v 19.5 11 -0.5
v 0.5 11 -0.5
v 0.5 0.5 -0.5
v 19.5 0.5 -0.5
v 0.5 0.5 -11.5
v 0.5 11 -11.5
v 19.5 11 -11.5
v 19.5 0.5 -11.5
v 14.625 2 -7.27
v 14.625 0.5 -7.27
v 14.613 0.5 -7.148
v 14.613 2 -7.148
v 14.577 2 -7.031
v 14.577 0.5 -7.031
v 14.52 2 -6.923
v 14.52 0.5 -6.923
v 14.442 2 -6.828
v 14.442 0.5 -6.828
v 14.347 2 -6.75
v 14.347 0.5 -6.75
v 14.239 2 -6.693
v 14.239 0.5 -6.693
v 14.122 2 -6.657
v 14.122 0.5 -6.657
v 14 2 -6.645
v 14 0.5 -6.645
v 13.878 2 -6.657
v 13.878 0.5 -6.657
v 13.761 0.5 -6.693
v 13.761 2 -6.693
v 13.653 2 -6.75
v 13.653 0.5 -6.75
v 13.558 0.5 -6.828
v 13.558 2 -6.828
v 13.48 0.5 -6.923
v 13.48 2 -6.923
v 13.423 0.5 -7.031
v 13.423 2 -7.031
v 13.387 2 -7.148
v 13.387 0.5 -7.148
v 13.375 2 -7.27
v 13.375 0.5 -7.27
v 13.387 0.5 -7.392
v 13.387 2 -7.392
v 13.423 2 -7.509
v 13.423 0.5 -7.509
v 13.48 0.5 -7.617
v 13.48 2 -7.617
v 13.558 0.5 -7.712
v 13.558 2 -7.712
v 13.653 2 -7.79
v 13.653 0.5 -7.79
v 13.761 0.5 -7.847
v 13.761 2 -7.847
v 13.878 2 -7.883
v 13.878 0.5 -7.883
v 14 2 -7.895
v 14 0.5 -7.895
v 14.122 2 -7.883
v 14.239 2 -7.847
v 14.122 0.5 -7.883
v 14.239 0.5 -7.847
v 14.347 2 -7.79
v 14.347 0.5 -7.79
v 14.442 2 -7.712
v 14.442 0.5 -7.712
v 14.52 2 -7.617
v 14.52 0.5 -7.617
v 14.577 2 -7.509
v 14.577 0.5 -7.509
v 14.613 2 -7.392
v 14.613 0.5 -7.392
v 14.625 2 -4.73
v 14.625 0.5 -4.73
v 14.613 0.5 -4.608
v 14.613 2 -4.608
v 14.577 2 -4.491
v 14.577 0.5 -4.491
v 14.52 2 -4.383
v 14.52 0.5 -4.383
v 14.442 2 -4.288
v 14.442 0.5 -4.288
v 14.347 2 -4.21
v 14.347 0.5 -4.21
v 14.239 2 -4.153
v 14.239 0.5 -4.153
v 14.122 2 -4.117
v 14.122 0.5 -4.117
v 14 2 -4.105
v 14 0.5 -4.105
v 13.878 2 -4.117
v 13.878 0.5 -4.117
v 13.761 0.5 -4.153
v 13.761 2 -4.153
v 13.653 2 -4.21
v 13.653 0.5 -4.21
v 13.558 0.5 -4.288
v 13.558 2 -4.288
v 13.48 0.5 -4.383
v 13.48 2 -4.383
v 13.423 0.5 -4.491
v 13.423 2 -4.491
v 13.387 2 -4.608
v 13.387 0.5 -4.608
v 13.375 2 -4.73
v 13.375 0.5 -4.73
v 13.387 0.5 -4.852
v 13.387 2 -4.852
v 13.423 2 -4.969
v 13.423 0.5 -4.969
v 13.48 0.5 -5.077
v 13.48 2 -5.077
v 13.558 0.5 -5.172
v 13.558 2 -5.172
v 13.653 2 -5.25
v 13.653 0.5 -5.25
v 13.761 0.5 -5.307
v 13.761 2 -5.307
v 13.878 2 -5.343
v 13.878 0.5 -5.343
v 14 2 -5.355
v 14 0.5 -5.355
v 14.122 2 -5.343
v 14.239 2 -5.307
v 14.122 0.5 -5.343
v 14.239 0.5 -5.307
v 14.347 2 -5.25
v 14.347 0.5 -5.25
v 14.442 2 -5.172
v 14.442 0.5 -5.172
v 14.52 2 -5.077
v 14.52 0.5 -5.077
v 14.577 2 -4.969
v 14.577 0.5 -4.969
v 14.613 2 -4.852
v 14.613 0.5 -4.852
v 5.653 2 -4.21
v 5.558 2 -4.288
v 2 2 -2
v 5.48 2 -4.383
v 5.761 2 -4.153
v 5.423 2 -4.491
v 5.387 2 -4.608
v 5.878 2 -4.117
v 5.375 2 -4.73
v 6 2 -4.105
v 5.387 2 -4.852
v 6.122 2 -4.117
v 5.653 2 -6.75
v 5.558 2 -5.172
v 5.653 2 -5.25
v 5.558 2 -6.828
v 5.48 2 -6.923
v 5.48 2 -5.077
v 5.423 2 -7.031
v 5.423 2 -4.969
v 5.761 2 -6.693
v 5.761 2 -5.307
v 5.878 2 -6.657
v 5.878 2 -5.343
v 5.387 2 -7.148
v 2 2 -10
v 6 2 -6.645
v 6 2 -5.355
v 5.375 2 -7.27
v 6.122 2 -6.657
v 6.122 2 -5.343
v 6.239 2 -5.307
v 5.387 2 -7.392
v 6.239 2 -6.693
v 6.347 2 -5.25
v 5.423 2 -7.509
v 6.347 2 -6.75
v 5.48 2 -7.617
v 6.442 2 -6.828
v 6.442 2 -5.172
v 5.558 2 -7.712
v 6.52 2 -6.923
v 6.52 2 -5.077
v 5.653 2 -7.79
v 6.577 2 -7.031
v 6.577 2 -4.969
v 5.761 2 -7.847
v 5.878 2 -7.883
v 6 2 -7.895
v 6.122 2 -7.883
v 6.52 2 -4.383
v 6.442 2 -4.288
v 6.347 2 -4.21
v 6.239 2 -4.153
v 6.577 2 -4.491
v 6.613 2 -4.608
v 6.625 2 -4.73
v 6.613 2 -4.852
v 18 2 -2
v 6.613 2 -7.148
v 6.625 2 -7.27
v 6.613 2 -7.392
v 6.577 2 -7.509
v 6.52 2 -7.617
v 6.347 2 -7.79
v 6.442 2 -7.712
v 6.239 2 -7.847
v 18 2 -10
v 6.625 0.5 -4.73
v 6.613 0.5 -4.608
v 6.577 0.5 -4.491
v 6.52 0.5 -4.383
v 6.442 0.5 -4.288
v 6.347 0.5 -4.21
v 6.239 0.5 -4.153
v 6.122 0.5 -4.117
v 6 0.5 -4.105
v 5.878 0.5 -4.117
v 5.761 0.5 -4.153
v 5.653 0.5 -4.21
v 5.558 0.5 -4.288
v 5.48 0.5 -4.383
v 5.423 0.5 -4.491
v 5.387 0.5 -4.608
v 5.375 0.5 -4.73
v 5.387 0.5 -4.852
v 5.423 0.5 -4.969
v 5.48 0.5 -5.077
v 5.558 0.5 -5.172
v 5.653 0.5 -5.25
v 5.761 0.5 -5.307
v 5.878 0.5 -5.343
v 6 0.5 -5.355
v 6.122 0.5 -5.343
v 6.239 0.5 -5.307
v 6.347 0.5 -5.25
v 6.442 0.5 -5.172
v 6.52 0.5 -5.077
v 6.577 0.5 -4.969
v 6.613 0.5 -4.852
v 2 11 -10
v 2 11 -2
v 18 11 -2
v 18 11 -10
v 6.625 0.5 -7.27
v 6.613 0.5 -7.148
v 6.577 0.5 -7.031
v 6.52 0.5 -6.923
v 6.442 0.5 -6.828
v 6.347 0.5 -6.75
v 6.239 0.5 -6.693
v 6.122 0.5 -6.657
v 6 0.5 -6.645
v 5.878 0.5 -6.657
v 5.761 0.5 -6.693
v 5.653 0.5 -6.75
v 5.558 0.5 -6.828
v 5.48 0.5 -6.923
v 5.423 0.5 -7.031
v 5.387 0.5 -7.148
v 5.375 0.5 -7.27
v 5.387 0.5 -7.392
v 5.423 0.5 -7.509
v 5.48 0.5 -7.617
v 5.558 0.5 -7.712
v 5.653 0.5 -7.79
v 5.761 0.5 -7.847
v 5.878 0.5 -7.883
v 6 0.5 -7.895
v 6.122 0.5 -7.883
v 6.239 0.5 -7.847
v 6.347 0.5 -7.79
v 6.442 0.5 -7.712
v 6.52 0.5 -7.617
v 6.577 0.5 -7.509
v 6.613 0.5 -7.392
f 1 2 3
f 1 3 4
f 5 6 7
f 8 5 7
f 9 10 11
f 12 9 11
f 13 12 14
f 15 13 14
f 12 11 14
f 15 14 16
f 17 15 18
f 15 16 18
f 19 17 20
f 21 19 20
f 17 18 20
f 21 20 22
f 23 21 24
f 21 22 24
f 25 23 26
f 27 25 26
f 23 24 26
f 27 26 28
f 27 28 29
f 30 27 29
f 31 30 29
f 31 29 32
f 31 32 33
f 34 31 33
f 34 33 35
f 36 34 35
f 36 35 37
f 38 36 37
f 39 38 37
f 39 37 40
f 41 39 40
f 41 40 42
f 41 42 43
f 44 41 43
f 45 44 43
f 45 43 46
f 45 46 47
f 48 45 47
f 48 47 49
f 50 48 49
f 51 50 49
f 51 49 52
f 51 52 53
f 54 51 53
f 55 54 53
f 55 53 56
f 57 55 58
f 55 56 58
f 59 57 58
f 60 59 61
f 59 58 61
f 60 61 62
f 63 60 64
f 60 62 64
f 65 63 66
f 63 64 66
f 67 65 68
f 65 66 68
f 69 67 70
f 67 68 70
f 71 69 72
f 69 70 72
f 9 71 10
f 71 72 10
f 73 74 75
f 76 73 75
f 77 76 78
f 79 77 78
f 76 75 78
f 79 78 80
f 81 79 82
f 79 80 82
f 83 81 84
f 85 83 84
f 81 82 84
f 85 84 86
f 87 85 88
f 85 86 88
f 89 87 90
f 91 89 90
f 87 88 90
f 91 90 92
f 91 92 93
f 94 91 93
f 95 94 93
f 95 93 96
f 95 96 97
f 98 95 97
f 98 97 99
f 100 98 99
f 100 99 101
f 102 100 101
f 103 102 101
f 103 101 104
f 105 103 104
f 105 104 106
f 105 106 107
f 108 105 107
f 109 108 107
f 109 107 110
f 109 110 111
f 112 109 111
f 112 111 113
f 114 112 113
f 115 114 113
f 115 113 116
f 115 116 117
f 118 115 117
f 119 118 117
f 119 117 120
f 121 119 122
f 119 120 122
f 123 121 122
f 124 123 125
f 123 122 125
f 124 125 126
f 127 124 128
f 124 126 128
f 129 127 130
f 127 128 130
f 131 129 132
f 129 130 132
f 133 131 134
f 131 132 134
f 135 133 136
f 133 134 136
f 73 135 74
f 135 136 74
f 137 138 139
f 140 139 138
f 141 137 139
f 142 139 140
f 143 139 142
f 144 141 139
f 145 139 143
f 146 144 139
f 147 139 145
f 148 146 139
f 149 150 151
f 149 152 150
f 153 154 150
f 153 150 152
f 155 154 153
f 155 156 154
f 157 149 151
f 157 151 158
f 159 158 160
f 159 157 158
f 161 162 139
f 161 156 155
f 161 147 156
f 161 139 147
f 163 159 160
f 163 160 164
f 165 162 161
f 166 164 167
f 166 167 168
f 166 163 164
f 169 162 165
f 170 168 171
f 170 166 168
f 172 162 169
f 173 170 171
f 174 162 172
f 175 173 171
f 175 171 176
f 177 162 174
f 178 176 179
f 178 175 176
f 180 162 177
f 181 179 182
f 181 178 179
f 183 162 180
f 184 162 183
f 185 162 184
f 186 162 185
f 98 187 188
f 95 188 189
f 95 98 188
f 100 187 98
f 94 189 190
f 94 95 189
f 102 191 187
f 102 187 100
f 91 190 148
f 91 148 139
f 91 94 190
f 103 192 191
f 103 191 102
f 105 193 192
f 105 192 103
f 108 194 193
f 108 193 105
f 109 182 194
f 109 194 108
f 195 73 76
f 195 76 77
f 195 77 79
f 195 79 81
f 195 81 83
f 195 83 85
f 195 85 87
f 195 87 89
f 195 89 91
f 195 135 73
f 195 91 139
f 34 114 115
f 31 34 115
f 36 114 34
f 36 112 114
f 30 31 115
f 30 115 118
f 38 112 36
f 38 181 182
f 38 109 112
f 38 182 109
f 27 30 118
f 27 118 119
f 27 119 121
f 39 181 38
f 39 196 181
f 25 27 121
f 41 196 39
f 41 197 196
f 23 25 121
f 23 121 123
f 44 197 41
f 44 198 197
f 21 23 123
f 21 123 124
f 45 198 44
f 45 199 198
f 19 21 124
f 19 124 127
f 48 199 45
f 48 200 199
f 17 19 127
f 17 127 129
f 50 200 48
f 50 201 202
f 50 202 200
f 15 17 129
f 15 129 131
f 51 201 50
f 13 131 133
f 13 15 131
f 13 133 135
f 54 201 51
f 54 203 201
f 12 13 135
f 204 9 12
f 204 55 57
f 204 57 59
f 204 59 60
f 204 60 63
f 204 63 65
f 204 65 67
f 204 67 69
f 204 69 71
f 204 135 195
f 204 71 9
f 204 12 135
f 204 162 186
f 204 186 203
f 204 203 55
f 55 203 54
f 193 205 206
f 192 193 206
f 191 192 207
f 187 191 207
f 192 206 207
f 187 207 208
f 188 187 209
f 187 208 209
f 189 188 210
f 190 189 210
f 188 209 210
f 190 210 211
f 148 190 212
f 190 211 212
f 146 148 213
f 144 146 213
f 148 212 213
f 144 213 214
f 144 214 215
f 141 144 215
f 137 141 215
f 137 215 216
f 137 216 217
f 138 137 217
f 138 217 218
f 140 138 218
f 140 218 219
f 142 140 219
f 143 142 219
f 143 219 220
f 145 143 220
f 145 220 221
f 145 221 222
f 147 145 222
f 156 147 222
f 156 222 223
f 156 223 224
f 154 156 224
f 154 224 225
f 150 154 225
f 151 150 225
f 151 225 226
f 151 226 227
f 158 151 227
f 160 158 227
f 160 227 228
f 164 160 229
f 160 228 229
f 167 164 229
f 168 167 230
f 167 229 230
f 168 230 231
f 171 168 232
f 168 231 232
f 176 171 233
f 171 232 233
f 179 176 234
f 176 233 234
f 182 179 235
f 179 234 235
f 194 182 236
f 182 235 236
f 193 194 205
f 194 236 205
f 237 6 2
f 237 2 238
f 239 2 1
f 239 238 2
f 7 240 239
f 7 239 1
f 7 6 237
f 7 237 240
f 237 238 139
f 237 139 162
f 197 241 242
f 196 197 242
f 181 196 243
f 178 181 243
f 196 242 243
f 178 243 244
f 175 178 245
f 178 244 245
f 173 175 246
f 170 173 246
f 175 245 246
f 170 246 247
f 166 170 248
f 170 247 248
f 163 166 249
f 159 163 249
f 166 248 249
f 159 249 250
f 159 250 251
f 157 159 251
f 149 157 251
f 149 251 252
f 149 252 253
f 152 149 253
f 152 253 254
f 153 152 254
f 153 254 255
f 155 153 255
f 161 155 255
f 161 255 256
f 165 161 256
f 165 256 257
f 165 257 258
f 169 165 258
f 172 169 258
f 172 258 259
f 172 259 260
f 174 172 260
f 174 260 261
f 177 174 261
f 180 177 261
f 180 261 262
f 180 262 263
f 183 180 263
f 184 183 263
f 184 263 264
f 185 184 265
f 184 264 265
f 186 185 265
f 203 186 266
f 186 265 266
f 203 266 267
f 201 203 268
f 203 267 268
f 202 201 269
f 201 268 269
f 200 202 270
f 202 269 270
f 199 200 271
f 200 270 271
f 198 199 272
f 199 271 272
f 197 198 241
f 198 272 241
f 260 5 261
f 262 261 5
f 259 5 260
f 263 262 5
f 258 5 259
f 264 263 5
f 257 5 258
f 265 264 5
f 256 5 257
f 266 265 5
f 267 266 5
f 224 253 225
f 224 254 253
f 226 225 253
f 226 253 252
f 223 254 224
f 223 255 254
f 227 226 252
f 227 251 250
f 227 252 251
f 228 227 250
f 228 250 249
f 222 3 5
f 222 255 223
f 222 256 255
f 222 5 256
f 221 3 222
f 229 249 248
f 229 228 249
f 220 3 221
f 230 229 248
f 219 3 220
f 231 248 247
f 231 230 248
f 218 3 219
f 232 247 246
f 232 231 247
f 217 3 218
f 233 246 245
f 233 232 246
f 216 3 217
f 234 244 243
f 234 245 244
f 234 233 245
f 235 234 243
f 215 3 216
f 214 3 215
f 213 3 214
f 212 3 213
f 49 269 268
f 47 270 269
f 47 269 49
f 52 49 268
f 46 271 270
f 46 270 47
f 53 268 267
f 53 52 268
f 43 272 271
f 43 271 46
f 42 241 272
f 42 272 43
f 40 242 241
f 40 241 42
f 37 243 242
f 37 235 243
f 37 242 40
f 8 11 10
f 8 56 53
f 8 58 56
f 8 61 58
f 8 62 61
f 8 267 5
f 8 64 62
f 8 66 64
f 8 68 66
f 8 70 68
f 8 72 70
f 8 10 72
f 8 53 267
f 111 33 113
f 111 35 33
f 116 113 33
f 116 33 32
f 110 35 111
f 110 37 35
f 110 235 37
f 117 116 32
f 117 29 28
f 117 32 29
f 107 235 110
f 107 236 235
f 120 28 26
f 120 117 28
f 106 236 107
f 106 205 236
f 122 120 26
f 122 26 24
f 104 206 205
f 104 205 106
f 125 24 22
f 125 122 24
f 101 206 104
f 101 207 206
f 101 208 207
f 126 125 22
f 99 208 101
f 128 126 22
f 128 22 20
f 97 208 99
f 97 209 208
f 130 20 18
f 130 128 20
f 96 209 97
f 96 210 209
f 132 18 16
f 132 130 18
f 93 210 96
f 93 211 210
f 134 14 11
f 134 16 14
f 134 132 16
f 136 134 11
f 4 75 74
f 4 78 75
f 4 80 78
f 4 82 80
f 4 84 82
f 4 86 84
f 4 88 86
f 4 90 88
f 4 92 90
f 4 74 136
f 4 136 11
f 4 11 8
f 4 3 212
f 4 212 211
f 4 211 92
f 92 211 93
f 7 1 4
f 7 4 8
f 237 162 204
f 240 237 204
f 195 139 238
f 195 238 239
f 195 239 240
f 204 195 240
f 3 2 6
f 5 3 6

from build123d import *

# Parameters (mm, degrees)
SKETCH1_W           = 20
SKETCH1_H           = 12
BOSS_EXTRUDE1_DEPTH = 11
SHELL1_T            = -2
SKETCH3_R           = 0.625
CUT_EXTRUDE1_DEPTH  = 10
LPATTERN1_COUNT     = 2
LPATTERN1_PITCH     = 8
SKETCH5_W           = 20
SKETCH5_H           = 12
SKETCH5_W_2         = 19
SKETCH5_H_2         = 11
CUT_EXTRUDE2_DEPTH  = 12
SKETCH6_W           = 19
SKETCH6_H           = 11
CUT_EXTRUDE3_DEPTH  = 0.5


with BuildPart() as part:
    # Sketch1 → Boss-Extrude1 (new body)
    with BuildSketch(Plane(origin=(0, 0, 0), x_dir=(1, 0, 0), z_dir=(0, 1, 0))):
        with Locations((10, 6)):
            Rectangle(SKETCH1_W, SKETCH1_H)
    extrude(amount=BOSS_EXTRUDE1_DEPTH)

    # Shell1
    shell1_openings = [part.faces().sort_by_distance(p)[0] for p in [
        (10, 11, -6),
    ]]
    offset(amount=SHELL1_T, openings=shell1_openings, kind=Kind.INTERSECTION)

    # Sketch3 → Cut-Extrude1 (cut)
    with BuildSketch(Plane.XZ):
        with Locations((6, -4.73)):
            Circle(SKETCH3_R)
        with Locations((6, -7.27)):
            Circle(SKETCH3_R)
    cut_extrude1 = extrude(amount=-CUT_EXTRUDE1_DEPTH, mode=Mode.SUBTRACT)

    # LPattern1: Cut-Extrude1 ×2
    with Locations(*[(i * LPATTERN1_PITCH, 0, 0) for i in range(1, LPATTERN1_COUNT)]):
        add(cut_extrude1, mode=Mode.SUBTRACT)

    # Sketch5 → Cut-Extrude2 (cut, through all)
    with BuildSketch(Plane(origin=(0, 11, 0), x_dir=(1, 0, 0), z_dir=(0, 1, 0))):
        with Locations((10, 6)):
            Rectangle(SKETCH5_W, SKETCH5_H)
        with Locations((10, 6)):
            Rectangle(SKETCH5_W_2, SKETCH5_H_2, mode=Mode.SUBTRACT)
    extrude(amount=-CUT_EXTRUDE2_DEPTH, mode=Mode.SUBTRACT)

    # Sketch6 → Cut-Extrude3 (cut)
    with BuildSketch(Plane.XZ):
        with Locations((10, -6)):
            Rectangle(SKETCH6_W, SKETCH6_H)
    extrude(amount=-CUT_EXTRUDE3_DEPTH, mode=Mode.SUBTRACT)


solid = part.part
